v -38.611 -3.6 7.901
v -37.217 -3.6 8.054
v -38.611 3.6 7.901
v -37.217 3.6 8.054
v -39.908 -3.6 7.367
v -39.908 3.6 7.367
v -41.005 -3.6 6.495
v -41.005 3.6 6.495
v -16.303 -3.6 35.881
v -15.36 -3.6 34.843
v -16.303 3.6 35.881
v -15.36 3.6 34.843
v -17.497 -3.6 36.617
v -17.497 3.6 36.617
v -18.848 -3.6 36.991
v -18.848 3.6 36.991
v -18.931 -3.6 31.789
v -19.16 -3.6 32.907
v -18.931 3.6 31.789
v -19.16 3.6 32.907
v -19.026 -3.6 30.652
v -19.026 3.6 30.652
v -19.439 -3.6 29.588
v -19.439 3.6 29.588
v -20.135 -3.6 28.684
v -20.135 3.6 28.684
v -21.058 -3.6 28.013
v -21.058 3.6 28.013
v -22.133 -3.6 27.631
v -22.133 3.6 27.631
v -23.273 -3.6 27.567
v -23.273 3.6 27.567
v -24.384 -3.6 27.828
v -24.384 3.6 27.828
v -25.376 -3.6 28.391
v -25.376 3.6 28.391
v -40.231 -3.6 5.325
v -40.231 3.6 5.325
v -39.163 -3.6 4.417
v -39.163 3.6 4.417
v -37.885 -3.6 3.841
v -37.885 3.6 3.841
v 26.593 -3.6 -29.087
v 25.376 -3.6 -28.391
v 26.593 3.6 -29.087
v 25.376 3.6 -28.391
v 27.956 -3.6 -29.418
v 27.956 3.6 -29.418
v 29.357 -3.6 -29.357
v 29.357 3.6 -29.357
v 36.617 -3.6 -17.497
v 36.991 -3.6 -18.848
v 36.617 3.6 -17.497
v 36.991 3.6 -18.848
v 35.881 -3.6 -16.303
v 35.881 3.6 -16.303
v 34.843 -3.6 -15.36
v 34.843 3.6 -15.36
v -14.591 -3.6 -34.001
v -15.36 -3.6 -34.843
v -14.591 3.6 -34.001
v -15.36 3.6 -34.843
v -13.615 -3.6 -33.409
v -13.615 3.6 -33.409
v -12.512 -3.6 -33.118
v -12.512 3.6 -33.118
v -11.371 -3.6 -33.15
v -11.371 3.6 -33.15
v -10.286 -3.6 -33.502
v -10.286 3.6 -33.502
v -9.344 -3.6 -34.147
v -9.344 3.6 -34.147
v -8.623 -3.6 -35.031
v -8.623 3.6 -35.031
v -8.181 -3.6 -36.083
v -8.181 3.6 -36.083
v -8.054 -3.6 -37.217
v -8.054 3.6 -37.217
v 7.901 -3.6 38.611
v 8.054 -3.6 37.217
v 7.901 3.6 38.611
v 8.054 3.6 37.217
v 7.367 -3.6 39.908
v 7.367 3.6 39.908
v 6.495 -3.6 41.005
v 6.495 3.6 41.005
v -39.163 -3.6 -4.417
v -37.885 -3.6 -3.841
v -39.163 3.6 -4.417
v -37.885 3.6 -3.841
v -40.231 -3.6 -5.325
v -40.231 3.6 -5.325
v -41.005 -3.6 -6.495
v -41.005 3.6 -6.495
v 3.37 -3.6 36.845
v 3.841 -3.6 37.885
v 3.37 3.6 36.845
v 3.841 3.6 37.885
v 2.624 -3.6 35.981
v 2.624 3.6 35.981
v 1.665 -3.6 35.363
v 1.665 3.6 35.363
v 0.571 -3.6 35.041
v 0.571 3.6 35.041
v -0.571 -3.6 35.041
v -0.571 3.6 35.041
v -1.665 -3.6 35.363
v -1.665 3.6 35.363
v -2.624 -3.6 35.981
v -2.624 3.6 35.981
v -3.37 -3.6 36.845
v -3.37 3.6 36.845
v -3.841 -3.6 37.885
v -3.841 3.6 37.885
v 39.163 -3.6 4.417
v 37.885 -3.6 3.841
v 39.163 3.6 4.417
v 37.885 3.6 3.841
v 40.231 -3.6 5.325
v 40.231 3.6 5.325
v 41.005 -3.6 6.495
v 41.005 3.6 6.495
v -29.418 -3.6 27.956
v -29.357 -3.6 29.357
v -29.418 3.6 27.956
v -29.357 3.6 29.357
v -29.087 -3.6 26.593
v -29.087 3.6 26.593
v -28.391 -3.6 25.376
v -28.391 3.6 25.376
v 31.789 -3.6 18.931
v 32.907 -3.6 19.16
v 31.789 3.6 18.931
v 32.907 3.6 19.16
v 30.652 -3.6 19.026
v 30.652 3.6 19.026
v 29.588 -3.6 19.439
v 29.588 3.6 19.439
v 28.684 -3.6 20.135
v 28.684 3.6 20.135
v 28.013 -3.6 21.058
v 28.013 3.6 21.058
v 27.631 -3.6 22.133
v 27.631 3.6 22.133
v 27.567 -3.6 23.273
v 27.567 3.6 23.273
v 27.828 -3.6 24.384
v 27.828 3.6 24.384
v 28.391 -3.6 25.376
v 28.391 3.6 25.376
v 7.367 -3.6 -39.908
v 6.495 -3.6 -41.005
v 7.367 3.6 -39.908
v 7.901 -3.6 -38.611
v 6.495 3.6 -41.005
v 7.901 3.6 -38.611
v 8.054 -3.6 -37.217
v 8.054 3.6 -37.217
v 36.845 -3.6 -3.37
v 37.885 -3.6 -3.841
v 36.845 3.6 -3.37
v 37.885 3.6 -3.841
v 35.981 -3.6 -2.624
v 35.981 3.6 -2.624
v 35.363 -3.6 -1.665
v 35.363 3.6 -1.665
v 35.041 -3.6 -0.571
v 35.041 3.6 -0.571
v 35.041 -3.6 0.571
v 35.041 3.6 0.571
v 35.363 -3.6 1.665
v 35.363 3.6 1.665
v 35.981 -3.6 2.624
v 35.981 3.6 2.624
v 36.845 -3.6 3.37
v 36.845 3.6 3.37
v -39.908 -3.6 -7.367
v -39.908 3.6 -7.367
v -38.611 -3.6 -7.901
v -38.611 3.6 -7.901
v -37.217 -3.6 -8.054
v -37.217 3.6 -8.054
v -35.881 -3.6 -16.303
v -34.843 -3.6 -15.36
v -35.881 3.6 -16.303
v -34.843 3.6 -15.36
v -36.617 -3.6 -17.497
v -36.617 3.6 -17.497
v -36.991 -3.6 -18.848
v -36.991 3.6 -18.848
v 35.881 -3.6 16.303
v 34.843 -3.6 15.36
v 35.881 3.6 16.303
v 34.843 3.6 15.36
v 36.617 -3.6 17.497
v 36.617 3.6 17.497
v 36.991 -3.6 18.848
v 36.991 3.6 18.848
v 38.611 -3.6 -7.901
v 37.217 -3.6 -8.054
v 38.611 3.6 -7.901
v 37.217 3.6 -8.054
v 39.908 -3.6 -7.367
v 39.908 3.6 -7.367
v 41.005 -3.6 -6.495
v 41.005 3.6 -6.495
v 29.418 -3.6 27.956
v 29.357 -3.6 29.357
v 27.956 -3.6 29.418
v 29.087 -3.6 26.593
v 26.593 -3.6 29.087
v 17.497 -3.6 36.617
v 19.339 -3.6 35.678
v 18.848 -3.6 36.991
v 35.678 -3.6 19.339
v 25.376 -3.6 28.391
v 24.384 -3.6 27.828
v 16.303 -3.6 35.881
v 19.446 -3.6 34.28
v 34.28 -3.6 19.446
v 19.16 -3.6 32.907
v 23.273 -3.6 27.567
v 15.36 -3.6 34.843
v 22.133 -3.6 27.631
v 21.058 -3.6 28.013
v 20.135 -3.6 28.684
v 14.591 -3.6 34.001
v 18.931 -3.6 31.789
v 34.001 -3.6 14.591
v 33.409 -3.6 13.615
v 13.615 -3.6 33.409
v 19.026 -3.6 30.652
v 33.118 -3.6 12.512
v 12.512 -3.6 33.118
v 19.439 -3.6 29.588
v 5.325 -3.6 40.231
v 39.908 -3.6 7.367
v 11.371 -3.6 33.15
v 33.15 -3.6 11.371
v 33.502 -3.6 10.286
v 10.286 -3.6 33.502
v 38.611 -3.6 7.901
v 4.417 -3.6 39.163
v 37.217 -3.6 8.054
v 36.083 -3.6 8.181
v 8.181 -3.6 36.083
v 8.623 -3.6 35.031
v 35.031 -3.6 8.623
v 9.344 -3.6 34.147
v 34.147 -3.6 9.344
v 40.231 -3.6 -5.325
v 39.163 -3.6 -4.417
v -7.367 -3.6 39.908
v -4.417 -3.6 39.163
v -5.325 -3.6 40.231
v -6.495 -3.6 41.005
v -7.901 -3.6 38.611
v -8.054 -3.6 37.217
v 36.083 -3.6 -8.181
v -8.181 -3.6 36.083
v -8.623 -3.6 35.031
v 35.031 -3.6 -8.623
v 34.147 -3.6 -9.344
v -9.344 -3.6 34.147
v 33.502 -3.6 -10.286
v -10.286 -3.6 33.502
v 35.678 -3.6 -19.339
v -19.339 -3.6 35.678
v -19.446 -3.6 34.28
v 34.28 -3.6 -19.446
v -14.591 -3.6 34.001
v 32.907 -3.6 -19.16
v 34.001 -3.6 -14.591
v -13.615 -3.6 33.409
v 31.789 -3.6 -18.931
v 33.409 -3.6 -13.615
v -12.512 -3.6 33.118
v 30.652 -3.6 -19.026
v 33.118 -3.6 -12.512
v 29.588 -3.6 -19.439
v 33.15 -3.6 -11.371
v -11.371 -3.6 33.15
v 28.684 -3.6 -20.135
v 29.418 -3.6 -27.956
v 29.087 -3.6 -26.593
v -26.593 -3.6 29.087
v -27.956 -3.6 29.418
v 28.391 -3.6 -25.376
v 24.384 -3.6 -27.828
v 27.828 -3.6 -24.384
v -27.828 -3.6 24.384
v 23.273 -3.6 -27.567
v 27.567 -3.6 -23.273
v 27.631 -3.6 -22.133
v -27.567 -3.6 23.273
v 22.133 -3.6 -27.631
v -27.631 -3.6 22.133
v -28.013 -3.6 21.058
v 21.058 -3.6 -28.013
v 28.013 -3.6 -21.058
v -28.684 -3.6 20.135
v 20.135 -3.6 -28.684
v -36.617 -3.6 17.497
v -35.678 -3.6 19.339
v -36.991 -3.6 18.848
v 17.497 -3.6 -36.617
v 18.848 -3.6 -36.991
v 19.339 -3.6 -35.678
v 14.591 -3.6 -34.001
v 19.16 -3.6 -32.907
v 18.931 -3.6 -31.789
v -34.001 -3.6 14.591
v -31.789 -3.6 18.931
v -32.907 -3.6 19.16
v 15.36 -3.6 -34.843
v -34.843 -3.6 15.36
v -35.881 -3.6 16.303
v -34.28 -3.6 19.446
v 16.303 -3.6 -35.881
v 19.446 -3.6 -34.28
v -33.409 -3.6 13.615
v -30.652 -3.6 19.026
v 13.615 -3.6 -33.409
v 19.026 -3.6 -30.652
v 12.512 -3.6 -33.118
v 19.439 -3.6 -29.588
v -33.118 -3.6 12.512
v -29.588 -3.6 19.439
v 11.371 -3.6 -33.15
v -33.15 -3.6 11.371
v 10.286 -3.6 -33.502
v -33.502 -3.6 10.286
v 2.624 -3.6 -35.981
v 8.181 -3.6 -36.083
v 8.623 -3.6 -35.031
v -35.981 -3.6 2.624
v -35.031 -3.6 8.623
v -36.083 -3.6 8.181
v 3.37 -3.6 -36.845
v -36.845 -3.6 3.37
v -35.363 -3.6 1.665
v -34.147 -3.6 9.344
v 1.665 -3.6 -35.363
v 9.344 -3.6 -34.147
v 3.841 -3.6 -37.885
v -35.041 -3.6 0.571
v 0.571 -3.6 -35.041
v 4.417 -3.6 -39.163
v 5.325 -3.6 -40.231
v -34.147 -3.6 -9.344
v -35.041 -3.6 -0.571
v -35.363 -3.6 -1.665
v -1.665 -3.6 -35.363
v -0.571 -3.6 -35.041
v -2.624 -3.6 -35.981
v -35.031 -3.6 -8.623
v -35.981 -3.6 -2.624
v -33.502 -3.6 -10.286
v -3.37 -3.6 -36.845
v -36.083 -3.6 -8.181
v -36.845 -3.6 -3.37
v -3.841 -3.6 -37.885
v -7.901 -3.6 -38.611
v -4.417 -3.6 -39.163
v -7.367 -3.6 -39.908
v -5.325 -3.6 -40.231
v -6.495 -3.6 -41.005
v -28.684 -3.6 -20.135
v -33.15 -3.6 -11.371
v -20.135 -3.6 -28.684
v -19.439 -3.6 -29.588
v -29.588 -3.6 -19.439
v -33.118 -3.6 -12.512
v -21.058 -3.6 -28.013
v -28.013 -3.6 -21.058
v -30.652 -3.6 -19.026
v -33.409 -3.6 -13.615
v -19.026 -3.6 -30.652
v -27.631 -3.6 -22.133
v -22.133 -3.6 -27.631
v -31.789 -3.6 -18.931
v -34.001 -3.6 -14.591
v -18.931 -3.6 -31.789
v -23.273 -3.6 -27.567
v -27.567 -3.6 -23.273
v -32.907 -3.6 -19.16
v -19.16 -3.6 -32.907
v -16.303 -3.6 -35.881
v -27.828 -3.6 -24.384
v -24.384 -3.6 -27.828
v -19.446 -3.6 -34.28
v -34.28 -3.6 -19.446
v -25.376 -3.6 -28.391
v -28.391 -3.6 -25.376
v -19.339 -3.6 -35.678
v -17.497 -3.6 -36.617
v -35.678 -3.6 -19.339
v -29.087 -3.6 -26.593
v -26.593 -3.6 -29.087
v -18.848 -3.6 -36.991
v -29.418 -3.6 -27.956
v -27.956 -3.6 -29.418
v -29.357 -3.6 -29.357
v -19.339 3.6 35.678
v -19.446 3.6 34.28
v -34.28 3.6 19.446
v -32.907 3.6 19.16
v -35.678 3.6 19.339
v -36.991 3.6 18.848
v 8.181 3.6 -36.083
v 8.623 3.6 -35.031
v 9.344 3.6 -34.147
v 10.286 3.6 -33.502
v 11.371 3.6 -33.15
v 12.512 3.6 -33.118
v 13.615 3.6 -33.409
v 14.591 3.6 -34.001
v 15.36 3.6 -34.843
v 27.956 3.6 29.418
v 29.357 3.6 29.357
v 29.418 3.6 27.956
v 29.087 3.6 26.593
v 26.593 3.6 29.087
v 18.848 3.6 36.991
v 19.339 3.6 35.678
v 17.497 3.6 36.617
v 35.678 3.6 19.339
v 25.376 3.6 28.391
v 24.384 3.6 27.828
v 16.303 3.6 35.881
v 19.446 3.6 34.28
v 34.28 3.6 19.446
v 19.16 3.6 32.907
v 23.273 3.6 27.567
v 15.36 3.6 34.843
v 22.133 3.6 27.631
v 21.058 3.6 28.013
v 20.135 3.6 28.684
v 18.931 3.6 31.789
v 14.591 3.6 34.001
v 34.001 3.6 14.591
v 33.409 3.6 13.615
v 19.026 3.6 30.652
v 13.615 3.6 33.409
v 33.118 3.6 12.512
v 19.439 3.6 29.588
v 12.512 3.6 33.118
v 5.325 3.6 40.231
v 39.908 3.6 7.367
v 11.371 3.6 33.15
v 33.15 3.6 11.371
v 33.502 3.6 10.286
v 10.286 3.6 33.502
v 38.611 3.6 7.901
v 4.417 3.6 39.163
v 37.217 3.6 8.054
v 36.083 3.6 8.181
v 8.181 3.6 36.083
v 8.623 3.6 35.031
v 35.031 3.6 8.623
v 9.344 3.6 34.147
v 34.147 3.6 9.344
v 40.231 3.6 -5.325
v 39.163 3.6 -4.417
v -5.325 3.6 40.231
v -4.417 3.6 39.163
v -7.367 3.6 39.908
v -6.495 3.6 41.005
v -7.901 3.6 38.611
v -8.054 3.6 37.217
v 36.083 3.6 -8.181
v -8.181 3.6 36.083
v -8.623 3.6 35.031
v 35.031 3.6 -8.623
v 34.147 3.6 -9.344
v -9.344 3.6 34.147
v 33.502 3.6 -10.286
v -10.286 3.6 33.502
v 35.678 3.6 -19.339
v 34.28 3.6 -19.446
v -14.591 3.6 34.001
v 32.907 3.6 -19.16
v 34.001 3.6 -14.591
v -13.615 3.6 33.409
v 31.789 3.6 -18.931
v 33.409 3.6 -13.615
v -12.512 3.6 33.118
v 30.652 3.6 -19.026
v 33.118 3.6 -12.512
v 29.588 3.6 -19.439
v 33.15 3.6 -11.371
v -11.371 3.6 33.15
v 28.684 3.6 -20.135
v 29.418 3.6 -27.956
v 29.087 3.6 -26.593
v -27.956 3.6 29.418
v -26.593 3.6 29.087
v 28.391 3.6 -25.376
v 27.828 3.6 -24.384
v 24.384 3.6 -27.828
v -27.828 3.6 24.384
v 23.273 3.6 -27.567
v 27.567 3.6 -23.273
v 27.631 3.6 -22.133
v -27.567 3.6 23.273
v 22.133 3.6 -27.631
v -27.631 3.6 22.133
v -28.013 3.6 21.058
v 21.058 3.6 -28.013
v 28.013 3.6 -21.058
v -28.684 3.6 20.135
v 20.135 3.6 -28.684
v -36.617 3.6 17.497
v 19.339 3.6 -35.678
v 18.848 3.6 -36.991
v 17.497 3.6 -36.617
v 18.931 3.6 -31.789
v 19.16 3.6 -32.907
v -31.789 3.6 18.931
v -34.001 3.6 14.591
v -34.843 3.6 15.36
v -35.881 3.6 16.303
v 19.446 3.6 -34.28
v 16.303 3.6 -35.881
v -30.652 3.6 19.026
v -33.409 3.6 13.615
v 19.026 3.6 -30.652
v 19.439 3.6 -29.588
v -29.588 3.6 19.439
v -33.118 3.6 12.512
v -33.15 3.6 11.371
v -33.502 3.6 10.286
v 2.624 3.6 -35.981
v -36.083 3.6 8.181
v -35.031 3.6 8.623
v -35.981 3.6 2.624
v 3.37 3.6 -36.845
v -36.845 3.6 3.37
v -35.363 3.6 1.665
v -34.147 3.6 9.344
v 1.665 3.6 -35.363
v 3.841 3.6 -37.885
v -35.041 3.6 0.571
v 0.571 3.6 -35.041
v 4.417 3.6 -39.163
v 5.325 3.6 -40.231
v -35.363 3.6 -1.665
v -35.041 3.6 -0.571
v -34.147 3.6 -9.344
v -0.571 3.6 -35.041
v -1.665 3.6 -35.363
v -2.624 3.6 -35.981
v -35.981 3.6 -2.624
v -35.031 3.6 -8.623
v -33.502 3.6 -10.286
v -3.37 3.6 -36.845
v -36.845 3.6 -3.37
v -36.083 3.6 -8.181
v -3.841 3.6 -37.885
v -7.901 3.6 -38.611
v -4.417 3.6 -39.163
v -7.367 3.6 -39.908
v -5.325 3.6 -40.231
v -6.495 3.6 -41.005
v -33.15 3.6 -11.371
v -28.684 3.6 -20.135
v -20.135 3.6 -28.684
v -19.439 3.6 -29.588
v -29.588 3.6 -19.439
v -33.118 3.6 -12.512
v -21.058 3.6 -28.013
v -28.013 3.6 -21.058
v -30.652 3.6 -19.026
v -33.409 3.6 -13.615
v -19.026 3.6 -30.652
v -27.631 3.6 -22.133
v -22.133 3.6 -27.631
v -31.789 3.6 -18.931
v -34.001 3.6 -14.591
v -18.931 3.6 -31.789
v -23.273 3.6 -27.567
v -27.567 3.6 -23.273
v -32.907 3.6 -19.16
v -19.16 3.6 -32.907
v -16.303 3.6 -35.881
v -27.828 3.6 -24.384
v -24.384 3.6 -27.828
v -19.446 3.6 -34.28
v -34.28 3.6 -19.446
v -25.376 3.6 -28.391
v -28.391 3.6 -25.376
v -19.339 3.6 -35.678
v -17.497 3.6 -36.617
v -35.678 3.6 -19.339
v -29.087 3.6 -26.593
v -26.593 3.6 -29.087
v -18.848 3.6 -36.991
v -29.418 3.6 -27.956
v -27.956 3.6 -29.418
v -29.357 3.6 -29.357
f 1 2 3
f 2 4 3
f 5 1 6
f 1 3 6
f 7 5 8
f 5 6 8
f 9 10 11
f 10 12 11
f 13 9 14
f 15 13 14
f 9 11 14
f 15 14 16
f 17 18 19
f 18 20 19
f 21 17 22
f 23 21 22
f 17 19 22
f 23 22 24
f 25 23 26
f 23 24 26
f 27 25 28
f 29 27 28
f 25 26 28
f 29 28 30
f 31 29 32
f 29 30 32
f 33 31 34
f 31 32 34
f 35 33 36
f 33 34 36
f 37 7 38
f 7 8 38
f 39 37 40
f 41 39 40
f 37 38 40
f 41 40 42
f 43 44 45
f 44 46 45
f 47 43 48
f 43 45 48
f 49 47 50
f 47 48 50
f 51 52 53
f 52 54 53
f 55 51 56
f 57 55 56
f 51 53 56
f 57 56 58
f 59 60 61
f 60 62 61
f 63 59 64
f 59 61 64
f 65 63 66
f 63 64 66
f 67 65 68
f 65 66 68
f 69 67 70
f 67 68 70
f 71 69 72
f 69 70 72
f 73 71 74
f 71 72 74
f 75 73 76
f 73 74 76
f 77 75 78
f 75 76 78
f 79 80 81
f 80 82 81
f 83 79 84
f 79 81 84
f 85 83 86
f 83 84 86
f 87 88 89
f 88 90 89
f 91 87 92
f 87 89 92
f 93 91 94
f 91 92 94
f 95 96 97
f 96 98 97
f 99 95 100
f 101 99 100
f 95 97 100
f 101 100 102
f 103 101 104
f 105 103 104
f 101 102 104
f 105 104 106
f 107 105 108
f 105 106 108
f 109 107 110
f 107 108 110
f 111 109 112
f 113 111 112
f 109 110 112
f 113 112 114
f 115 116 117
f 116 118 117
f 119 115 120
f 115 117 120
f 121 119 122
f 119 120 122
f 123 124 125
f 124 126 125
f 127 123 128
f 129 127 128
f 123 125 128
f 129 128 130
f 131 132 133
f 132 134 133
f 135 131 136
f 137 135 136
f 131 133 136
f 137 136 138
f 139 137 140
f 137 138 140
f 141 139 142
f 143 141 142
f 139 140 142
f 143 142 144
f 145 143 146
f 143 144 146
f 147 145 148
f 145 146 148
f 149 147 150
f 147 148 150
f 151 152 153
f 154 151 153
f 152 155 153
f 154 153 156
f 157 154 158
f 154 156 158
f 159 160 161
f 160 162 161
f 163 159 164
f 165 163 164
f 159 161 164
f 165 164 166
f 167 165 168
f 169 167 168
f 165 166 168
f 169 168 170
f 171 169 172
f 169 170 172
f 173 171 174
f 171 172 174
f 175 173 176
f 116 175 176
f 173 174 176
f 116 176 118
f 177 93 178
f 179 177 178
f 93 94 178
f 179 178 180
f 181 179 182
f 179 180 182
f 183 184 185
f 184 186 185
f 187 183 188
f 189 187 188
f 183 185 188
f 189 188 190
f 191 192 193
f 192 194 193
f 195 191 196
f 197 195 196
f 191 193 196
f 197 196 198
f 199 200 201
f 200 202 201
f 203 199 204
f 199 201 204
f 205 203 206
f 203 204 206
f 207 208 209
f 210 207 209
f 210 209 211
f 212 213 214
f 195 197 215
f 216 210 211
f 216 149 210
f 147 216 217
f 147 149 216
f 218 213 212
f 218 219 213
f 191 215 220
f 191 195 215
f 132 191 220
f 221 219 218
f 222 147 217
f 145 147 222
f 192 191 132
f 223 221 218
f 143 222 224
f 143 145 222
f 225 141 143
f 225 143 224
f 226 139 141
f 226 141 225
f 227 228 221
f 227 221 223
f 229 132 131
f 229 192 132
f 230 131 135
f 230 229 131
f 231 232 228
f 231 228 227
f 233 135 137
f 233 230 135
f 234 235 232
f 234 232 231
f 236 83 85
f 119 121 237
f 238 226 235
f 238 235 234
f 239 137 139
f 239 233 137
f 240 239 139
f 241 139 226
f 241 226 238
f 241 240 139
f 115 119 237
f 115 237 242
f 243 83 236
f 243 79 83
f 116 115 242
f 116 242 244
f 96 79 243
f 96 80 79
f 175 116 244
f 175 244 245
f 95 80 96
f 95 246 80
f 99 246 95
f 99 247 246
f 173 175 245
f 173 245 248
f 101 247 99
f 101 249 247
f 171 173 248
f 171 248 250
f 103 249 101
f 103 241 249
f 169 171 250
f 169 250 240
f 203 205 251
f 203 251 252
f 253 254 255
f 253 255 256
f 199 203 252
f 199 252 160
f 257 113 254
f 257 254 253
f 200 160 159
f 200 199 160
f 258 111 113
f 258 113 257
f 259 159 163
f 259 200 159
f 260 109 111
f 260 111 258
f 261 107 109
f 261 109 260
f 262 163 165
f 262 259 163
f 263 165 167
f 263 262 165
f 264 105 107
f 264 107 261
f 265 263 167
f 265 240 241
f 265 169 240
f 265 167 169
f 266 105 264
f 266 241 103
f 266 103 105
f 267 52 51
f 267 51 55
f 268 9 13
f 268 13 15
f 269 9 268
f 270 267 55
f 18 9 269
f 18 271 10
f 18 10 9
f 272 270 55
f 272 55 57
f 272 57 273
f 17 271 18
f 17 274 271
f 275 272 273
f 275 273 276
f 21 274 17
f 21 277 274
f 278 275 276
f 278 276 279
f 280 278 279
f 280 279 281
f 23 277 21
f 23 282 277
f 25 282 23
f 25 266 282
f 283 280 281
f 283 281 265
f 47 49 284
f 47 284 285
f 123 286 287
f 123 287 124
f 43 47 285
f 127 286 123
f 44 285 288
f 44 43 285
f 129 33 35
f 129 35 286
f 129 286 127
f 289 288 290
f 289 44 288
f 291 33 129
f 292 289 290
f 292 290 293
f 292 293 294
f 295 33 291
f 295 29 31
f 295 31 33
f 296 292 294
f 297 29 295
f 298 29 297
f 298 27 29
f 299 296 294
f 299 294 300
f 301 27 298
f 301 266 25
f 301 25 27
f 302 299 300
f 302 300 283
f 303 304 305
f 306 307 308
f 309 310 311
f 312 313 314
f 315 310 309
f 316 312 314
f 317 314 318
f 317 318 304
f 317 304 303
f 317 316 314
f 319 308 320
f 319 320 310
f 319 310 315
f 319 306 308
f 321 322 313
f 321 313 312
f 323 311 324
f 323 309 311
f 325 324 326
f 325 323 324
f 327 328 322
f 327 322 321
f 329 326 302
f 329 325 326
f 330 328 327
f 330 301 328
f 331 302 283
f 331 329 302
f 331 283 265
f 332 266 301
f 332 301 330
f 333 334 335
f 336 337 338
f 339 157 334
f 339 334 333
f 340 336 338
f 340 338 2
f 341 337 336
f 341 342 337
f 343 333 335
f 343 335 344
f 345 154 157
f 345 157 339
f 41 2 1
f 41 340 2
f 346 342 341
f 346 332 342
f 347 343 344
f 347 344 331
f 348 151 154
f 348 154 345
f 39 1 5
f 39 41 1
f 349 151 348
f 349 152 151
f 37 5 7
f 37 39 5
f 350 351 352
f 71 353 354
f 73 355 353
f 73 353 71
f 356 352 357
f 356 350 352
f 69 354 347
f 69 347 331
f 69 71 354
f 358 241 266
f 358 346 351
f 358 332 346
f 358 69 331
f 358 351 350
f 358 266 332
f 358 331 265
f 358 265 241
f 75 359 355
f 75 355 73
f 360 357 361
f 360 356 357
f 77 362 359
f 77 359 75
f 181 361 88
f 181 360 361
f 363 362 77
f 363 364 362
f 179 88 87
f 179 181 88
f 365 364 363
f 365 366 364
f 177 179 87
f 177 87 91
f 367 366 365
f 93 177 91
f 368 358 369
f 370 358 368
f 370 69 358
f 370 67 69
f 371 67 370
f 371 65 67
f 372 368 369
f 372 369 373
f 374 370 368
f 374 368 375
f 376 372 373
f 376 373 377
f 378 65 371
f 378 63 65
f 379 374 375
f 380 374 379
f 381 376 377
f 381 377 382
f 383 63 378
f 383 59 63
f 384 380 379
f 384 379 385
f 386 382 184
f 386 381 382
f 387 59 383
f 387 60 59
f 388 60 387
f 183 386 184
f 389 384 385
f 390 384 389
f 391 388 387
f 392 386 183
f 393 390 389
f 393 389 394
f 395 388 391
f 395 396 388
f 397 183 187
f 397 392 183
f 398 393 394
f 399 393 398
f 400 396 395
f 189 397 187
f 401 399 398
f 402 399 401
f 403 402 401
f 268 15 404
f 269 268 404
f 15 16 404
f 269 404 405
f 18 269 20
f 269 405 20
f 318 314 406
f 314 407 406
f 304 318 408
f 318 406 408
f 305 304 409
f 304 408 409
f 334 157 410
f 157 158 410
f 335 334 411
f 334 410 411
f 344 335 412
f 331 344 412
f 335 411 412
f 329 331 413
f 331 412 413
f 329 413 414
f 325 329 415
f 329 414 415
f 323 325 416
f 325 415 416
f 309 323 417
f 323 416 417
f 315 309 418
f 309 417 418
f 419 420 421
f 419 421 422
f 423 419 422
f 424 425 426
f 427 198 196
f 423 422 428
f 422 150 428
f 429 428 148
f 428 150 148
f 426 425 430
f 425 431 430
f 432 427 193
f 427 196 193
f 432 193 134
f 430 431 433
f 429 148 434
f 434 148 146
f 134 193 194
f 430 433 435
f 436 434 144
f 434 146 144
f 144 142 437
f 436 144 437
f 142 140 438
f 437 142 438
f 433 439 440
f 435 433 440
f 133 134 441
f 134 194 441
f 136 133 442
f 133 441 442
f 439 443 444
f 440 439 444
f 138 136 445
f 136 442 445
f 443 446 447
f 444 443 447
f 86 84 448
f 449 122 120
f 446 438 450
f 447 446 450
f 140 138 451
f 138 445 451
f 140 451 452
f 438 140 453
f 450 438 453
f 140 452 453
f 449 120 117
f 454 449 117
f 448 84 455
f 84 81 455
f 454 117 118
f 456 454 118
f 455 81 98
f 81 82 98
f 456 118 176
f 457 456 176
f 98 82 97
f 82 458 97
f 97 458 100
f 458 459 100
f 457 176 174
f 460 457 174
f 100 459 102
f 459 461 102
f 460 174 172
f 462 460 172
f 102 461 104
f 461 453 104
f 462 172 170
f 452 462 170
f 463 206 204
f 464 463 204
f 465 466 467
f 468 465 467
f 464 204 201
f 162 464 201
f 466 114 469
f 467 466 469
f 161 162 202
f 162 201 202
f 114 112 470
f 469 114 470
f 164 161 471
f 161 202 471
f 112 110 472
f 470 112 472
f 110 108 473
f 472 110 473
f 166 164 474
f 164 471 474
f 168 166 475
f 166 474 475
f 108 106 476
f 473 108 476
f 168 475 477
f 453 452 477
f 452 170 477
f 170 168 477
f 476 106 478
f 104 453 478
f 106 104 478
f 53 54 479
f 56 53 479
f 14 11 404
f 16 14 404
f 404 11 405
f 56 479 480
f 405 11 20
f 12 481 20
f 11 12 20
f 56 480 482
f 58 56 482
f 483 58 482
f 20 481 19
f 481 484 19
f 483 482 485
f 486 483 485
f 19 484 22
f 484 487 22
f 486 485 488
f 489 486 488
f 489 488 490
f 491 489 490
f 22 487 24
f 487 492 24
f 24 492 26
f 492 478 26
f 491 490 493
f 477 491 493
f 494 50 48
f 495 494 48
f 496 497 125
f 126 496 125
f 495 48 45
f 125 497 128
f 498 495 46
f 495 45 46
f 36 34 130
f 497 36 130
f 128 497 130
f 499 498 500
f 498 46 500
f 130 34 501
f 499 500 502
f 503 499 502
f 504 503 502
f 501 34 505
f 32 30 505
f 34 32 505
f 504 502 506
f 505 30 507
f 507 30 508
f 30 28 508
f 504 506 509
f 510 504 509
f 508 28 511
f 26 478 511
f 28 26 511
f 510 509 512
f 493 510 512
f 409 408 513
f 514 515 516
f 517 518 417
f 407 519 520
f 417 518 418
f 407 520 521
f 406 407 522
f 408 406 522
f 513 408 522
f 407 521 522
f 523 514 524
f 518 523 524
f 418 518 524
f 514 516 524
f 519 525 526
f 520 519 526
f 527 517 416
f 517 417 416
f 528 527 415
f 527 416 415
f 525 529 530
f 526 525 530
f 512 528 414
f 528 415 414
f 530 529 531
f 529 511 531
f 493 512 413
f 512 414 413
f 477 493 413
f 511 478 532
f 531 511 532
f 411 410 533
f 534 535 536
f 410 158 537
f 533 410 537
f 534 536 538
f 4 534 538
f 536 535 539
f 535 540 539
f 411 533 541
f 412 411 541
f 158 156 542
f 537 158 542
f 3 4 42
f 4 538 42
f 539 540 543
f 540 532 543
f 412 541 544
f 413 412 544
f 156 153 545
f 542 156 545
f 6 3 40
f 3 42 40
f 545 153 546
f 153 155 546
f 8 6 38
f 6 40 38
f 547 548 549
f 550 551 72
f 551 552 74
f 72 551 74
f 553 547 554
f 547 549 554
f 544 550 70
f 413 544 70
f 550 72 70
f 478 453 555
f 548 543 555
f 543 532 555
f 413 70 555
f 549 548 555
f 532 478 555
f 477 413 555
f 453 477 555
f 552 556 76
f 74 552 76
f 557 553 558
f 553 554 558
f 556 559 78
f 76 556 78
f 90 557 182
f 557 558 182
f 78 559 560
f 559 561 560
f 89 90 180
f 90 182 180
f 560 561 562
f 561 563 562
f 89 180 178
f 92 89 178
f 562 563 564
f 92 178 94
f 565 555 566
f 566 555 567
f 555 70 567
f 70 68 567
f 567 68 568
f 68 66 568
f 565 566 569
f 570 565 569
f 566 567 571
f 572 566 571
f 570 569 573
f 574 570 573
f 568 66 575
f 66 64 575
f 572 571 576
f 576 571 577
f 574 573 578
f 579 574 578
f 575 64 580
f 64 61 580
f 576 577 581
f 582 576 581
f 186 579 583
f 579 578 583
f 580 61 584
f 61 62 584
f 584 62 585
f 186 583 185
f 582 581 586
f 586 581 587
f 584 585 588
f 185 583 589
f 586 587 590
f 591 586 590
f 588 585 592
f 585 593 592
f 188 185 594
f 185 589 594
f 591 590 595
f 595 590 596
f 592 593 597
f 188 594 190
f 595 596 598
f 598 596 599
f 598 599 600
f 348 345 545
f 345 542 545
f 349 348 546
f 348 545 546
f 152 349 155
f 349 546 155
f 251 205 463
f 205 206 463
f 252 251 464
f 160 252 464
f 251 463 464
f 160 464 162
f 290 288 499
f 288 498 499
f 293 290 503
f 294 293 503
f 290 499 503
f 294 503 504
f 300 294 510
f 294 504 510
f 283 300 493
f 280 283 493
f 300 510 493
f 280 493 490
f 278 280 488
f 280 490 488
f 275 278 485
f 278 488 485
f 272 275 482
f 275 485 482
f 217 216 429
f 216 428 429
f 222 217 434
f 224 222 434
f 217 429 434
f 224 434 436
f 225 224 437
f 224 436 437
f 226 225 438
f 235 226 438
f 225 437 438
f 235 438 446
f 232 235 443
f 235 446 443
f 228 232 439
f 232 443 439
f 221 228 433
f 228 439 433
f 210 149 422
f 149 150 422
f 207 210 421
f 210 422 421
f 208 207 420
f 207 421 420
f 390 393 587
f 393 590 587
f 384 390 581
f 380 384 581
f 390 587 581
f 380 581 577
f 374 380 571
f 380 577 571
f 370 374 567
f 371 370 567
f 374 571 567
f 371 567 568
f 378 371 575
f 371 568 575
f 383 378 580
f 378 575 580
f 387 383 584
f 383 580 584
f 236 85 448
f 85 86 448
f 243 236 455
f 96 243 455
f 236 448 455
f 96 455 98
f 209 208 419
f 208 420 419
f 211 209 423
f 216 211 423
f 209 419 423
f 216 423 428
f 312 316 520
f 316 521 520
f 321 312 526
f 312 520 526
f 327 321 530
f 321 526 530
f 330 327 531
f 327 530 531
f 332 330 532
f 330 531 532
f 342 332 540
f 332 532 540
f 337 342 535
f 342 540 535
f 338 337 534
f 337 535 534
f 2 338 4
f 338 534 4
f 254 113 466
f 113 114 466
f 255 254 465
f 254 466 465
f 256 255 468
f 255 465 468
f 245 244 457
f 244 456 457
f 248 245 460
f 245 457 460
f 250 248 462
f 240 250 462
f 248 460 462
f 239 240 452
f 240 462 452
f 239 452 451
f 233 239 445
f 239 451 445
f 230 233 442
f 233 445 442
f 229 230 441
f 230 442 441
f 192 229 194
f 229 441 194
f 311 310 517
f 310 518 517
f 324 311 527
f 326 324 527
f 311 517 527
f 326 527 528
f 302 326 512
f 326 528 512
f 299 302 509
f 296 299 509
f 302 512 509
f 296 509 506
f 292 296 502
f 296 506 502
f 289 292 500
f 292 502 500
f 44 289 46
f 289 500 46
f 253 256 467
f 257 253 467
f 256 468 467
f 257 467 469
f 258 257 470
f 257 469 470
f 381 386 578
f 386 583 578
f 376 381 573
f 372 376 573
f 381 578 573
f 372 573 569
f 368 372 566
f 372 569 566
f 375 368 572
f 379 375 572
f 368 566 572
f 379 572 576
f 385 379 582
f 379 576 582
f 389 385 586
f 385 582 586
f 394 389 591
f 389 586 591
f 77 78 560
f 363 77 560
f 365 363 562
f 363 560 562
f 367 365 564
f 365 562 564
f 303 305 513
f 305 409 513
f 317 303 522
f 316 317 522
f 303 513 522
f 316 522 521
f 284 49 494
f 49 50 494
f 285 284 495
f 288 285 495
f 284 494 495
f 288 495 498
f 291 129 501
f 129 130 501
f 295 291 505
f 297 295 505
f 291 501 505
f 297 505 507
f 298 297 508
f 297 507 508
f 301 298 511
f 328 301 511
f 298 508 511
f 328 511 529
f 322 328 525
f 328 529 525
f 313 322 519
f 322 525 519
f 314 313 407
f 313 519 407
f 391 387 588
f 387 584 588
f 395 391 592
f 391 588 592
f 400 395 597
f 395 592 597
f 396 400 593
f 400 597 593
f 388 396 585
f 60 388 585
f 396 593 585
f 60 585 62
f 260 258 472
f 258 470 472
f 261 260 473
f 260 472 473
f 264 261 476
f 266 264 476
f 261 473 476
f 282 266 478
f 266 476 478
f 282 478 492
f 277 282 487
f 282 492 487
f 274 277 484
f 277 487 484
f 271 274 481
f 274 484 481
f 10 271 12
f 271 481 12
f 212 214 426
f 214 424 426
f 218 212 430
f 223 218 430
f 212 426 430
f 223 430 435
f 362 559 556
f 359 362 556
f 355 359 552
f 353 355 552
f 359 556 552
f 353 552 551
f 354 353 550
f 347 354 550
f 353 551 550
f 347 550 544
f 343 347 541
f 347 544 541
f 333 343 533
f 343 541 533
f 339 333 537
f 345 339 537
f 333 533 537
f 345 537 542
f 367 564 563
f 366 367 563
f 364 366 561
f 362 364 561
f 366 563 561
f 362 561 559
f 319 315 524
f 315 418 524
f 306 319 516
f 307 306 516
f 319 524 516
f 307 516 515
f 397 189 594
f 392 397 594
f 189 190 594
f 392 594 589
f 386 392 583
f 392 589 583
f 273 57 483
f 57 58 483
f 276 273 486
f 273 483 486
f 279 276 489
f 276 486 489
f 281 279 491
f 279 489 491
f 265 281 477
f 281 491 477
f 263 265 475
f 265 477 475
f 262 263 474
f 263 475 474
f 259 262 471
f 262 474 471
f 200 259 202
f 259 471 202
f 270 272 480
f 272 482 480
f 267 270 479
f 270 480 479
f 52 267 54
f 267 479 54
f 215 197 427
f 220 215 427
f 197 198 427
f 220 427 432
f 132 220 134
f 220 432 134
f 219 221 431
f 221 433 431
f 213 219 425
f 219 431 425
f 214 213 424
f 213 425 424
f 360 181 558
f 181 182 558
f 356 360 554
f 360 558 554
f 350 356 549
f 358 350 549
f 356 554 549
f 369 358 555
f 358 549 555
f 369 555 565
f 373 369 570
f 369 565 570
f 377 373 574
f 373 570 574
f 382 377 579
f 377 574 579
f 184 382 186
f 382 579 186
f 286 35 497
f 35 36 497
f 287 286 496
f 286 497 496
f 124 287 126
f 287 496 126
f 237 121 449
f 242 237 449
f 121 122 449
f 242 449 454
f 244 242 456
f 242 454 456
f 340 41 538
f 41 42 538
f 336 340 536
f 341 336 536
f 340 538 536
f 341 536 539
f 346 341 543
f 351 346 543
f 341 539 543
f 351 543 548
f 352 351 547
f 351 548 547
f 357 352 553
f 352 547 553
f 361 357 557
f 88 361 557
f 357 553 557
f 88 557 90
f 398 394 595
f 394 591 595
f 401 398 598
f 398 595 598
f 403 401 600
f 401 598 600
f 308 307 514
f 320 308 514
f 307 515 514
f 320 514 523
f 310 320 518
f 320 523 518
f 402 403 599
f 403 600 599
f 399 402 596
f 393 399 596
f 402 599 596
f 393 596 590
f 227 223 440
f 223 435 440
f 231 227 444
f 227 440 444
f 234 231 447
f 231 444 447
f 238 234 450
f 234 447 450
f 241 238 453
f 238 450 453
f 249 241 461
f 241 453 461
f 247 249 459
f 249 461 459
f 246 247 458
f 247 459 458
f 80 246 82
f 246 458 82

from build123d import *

# Parameters (mm, degrees)
SALIENTE_EXTRUIR2_DEPTH = 3.6


with BuildPart() as part:
    # Croquis1 → Saliente-Extruir2 (new, symmetric)
    with BuildSketch(Plane(origin=(0, 0, 0), x_dir=(1, 0, 0), z_dir=(0, 1, 0))):
        with BuildLine():
            ThreePointArc((-3.841343145, 37.884615385), (0, 35), (3.841343145, 37.884615385))
            ThreePointArc((3.841343145, 37.884615385), (4.833741548, 39.729116135), (6.494598229, 41.005279406))
            ThreePointArc((6.494598229, 41.005279406), (7.679810659, 39.278343072), (8.05365555, 37.217450642))
            ThreePointArc((8.05365555, 37.217450642), (10.815594803, 33.28697807), (15.360324409, 34.843370016))
            ThreePointArc((15.360324409, 34.843370016), (16.874133455, 36.290926502), (18.848058162, 36.991396957))
            ThreePointArc((18.848058162, 36.991396957), (19.441609492, 34.98273212), (19.160306326, 32.907182521))
            ThreePointArc((19.160306326, 32.907182521), (20.57248383, 28.315594803), (25.375730098, 28.391412822))
            ThreePointArc((25.375730098, 28.391412822), (27.26276761, 29.300328129), (29.35653884, 29.35653884))
            ThreePointArc((29.35653884, 29.35653884), (29.300328129, 27.26276761), (28.391412822, 25.375730098))
            ThreePointArc((28.391412822, 25.375730098), (28.315594803, 20.57248383), (32.907182521, 19.160306326))
            ThreePointArc((32.907182521, 19.160306326), (34.98273212, 19.441609492), (36.991396957, 18.848058162))
            ThreePointArc((36.991396957, 18.848058162), (36.290926502, 16.874133455), (34.843370016, 15.360324409))
            ThreePointArc((34.843370016, 15.360324409), (33.28697807, 10.815594803), (37.217450642, 8.05365555))
            ThreePointArc((37.217450642, 8.05365555), (39.278343072, 7.679810659), (41.005279406, 6.494598229))
            ThreePointArc((41.005279406, 6.494598229), (39.729116135, 4.833741548), (37.884615385, 3.841343145))
            ThreePointArc((37.884615385, 3.841343145), (35, 0), (37.884615385, -3.841343145))
            ThreePointArc((37.884615385, -3.841343145), (39.729116135, -4.833741548), (41.005279406, -6.494598229))
            ThreePointArc((41.005279406, -6.494598229), (39.278343072, -7.679810659), (37.217450642, -8.05365555))
            ThreePointArc((37.217450642, -8.05365555), (33.28697807, -10.815594803), (34.843370016, -15.360324409))
            ThreePointArc((34.843370016, -15.360324409), (36.290926502, -16.874133455), (36.991396957, -18.848058162))
            ThreePointArc((36.991396957, -18.848058162), (34.98273212, -19.441609492), (32.907182521, -19.160306326))
            ThreePointArc((32.907182521, -19.160306326), (28.315594803, -20.57248383), (28.391412822, -25.375730098))
            ThreePointArc((28.391412822, -25.375730098), (29.300328129, -27.26276761), (29.35653884, -29.35653884))
            ThreePointArc((29.35653884, -29.35653884), (27.26276761, -29.300328129), (25.375730098, -28.391412822))
            ThreePointArc((25.375730098, -28.391412822), (20.57248383, -28.315594803), (19.160306326, -32.907182521))
            ThreePointArc((19.160306326, -32.907182521), (19.441609492, -34.98273212), (18.848058162, -36.991396957))
            ThreePointArc((18.848058162, -36.991396957), (16.874133455, -36.290926502), (15.360324409, -34.843370016))
            ThreePointArc((15.360324409, -34.843370016), (10.815594803, -33.28697807), (8.05365555, -37.217450642))
            ThreePointArc((8.05365555, -37.217450642), (7.679810659, -39.278343072), (6.494598229, -41.005279406))
            ThreePointArc((6.494598229, -41.005279406), (4.833741548, -39.729116135), (3.841343145, -37.884615385))
            ThreePointArc((3.841343145, -37.884615385), (0, -35), (-3.841343145, -37.884615385))
            ThreePointArc((-3.841343145, -37.884615385), (-4.833741548, -39.729116135), (-6.494598229, -41.005279406))
            ThreePointArc((-6.494598229, -41.005279406), (-7.679810659, -39.278343072), (-8.05365555, -37.217450642))
            ThreePointArc((-8.05365555, -37.217450642), (-10.815594803, -33.28697807), (-15.360324409, -34.843370016))
            ThreePointArc((-15.360324409, -34.843370016), (-16.874133455, -36.290926502), (-18.848058162, -36.991396957))
            ThreePointArc((-18.848058162, -36.991396957), (-19.441609492, -34.98273212), (-19.160306326, -32.907182521))
            ThreePointArc((-19.160306326, -32.907182521), (-20.57248383, -28.315594803), (-25.375730098, -28.391412822))
            ThreePointArc((-25.375730098, -28.391412822), (-27.26276761, -29.300328129), (-29.35653884, -29.35653884))
            ThreePointArc((-29.35653884, -29.35653884), (-29.300328129, -27.26276761), (-28.391412822, -25.375730098))
            ThreePointArc((-28.391412822, -25.375730098), (-28.315594803, -20.57248383), (-32.907182521, -19.160306326))
            ThreePointArc((-32.907182521, -19.160306326), (-34.98273212, -19.441609492), (-36.991396957, -18.848058162))
            ThreePointArc((-36.991396957, -18.848058162), (-36.290926502, -16.874133455), (-34.843370016, -15.360324409))
            ThreePointArc((-34.843370016, -15.360324409), (-33.28697807, -10.815594803), (-37.217450642, -8.05365555))
            ThreePointArc((-37.217450642, -8.05365555), (-39.278343072, -7.679810659), (-41.005279406, -6.494598229))
            ThreePointArc((-41.005279406, -6.494598229), (-39.729116135, -4.833741548), (-37.884615385, -3.841343145))
            ThreePointArc((-37.884615385, -3.841343145), (-35, 0), (-37.884615385, 3.841343145))
            ThreePointArc((-37.884615385, 3.841343145), (-39.729116135, 4.833741548), (-41.005279406, 6.494598229))
            ThreePointArc((-41.005279406, 6.494598229), (-39.278343072, 7.679810659), (-37.217450642, 8.05365555))
            ThreePointArc((-37.217450642, 8.05365555), (-33.28697807, 10.815594803), (-34.843370016, 15.360324409))
            ThreePointArc((-34.843370016, 15.360324409), (-36.290926502, 16.874133455), (-36.991396957, 18.848058162))
            ThreePointArc((-36.991396957, 18.848058162), (-34.98273212, 19.441609492), (-32.907182521, 19.160306326))
            ThreePointArc((-32.907182521, 19.160306326), (-28.315594803, 20.57248383), (-28.391412822, 25.375730098))
            ThreePointArc((-28.391412822, 25.375730098), (-29.300328129, 27.26276761), (-29.35653884, 29.35653884))
            ThreePointArc((-29.35653884, 29.35653884), (-27.26276761, 29.300328129), (-25.375730098, 28.391412822))
            ThreePointArc((-25.375730098, 28.391412822), (-20.57248383, 28.315594803), (-19.160306326, 32.907182521))
            ThreePointArc((-19.160306326, 32.907182521), (-19.441609492, 34.98273212), (-18.848058162, 36.991396957))
            ThreePointArc((-18.848058162, 36.991396957), (-16.874133455, 36.290926502), (-15.360324409, 34.843370016))
            ThreePointArc((-15.360324409, 34.843370016), (-10.815594803, 33.28697807), (-8.05365555, 37.217450642))
            ThreePointArc((-8.05365555, 37.217450642), (-7.679810659, 39.278343072), (-6.494598229, 41.005279406))
            ThreePointArc((-6.494598229, 41.005279406), (-4.833741548, 39.729116135), (-3.841343145, 37.884615385))
        make_face()
    extrude(amount=SALIENTE_EXTRUIR2_DEPTH, both=True)


solid = part.part
